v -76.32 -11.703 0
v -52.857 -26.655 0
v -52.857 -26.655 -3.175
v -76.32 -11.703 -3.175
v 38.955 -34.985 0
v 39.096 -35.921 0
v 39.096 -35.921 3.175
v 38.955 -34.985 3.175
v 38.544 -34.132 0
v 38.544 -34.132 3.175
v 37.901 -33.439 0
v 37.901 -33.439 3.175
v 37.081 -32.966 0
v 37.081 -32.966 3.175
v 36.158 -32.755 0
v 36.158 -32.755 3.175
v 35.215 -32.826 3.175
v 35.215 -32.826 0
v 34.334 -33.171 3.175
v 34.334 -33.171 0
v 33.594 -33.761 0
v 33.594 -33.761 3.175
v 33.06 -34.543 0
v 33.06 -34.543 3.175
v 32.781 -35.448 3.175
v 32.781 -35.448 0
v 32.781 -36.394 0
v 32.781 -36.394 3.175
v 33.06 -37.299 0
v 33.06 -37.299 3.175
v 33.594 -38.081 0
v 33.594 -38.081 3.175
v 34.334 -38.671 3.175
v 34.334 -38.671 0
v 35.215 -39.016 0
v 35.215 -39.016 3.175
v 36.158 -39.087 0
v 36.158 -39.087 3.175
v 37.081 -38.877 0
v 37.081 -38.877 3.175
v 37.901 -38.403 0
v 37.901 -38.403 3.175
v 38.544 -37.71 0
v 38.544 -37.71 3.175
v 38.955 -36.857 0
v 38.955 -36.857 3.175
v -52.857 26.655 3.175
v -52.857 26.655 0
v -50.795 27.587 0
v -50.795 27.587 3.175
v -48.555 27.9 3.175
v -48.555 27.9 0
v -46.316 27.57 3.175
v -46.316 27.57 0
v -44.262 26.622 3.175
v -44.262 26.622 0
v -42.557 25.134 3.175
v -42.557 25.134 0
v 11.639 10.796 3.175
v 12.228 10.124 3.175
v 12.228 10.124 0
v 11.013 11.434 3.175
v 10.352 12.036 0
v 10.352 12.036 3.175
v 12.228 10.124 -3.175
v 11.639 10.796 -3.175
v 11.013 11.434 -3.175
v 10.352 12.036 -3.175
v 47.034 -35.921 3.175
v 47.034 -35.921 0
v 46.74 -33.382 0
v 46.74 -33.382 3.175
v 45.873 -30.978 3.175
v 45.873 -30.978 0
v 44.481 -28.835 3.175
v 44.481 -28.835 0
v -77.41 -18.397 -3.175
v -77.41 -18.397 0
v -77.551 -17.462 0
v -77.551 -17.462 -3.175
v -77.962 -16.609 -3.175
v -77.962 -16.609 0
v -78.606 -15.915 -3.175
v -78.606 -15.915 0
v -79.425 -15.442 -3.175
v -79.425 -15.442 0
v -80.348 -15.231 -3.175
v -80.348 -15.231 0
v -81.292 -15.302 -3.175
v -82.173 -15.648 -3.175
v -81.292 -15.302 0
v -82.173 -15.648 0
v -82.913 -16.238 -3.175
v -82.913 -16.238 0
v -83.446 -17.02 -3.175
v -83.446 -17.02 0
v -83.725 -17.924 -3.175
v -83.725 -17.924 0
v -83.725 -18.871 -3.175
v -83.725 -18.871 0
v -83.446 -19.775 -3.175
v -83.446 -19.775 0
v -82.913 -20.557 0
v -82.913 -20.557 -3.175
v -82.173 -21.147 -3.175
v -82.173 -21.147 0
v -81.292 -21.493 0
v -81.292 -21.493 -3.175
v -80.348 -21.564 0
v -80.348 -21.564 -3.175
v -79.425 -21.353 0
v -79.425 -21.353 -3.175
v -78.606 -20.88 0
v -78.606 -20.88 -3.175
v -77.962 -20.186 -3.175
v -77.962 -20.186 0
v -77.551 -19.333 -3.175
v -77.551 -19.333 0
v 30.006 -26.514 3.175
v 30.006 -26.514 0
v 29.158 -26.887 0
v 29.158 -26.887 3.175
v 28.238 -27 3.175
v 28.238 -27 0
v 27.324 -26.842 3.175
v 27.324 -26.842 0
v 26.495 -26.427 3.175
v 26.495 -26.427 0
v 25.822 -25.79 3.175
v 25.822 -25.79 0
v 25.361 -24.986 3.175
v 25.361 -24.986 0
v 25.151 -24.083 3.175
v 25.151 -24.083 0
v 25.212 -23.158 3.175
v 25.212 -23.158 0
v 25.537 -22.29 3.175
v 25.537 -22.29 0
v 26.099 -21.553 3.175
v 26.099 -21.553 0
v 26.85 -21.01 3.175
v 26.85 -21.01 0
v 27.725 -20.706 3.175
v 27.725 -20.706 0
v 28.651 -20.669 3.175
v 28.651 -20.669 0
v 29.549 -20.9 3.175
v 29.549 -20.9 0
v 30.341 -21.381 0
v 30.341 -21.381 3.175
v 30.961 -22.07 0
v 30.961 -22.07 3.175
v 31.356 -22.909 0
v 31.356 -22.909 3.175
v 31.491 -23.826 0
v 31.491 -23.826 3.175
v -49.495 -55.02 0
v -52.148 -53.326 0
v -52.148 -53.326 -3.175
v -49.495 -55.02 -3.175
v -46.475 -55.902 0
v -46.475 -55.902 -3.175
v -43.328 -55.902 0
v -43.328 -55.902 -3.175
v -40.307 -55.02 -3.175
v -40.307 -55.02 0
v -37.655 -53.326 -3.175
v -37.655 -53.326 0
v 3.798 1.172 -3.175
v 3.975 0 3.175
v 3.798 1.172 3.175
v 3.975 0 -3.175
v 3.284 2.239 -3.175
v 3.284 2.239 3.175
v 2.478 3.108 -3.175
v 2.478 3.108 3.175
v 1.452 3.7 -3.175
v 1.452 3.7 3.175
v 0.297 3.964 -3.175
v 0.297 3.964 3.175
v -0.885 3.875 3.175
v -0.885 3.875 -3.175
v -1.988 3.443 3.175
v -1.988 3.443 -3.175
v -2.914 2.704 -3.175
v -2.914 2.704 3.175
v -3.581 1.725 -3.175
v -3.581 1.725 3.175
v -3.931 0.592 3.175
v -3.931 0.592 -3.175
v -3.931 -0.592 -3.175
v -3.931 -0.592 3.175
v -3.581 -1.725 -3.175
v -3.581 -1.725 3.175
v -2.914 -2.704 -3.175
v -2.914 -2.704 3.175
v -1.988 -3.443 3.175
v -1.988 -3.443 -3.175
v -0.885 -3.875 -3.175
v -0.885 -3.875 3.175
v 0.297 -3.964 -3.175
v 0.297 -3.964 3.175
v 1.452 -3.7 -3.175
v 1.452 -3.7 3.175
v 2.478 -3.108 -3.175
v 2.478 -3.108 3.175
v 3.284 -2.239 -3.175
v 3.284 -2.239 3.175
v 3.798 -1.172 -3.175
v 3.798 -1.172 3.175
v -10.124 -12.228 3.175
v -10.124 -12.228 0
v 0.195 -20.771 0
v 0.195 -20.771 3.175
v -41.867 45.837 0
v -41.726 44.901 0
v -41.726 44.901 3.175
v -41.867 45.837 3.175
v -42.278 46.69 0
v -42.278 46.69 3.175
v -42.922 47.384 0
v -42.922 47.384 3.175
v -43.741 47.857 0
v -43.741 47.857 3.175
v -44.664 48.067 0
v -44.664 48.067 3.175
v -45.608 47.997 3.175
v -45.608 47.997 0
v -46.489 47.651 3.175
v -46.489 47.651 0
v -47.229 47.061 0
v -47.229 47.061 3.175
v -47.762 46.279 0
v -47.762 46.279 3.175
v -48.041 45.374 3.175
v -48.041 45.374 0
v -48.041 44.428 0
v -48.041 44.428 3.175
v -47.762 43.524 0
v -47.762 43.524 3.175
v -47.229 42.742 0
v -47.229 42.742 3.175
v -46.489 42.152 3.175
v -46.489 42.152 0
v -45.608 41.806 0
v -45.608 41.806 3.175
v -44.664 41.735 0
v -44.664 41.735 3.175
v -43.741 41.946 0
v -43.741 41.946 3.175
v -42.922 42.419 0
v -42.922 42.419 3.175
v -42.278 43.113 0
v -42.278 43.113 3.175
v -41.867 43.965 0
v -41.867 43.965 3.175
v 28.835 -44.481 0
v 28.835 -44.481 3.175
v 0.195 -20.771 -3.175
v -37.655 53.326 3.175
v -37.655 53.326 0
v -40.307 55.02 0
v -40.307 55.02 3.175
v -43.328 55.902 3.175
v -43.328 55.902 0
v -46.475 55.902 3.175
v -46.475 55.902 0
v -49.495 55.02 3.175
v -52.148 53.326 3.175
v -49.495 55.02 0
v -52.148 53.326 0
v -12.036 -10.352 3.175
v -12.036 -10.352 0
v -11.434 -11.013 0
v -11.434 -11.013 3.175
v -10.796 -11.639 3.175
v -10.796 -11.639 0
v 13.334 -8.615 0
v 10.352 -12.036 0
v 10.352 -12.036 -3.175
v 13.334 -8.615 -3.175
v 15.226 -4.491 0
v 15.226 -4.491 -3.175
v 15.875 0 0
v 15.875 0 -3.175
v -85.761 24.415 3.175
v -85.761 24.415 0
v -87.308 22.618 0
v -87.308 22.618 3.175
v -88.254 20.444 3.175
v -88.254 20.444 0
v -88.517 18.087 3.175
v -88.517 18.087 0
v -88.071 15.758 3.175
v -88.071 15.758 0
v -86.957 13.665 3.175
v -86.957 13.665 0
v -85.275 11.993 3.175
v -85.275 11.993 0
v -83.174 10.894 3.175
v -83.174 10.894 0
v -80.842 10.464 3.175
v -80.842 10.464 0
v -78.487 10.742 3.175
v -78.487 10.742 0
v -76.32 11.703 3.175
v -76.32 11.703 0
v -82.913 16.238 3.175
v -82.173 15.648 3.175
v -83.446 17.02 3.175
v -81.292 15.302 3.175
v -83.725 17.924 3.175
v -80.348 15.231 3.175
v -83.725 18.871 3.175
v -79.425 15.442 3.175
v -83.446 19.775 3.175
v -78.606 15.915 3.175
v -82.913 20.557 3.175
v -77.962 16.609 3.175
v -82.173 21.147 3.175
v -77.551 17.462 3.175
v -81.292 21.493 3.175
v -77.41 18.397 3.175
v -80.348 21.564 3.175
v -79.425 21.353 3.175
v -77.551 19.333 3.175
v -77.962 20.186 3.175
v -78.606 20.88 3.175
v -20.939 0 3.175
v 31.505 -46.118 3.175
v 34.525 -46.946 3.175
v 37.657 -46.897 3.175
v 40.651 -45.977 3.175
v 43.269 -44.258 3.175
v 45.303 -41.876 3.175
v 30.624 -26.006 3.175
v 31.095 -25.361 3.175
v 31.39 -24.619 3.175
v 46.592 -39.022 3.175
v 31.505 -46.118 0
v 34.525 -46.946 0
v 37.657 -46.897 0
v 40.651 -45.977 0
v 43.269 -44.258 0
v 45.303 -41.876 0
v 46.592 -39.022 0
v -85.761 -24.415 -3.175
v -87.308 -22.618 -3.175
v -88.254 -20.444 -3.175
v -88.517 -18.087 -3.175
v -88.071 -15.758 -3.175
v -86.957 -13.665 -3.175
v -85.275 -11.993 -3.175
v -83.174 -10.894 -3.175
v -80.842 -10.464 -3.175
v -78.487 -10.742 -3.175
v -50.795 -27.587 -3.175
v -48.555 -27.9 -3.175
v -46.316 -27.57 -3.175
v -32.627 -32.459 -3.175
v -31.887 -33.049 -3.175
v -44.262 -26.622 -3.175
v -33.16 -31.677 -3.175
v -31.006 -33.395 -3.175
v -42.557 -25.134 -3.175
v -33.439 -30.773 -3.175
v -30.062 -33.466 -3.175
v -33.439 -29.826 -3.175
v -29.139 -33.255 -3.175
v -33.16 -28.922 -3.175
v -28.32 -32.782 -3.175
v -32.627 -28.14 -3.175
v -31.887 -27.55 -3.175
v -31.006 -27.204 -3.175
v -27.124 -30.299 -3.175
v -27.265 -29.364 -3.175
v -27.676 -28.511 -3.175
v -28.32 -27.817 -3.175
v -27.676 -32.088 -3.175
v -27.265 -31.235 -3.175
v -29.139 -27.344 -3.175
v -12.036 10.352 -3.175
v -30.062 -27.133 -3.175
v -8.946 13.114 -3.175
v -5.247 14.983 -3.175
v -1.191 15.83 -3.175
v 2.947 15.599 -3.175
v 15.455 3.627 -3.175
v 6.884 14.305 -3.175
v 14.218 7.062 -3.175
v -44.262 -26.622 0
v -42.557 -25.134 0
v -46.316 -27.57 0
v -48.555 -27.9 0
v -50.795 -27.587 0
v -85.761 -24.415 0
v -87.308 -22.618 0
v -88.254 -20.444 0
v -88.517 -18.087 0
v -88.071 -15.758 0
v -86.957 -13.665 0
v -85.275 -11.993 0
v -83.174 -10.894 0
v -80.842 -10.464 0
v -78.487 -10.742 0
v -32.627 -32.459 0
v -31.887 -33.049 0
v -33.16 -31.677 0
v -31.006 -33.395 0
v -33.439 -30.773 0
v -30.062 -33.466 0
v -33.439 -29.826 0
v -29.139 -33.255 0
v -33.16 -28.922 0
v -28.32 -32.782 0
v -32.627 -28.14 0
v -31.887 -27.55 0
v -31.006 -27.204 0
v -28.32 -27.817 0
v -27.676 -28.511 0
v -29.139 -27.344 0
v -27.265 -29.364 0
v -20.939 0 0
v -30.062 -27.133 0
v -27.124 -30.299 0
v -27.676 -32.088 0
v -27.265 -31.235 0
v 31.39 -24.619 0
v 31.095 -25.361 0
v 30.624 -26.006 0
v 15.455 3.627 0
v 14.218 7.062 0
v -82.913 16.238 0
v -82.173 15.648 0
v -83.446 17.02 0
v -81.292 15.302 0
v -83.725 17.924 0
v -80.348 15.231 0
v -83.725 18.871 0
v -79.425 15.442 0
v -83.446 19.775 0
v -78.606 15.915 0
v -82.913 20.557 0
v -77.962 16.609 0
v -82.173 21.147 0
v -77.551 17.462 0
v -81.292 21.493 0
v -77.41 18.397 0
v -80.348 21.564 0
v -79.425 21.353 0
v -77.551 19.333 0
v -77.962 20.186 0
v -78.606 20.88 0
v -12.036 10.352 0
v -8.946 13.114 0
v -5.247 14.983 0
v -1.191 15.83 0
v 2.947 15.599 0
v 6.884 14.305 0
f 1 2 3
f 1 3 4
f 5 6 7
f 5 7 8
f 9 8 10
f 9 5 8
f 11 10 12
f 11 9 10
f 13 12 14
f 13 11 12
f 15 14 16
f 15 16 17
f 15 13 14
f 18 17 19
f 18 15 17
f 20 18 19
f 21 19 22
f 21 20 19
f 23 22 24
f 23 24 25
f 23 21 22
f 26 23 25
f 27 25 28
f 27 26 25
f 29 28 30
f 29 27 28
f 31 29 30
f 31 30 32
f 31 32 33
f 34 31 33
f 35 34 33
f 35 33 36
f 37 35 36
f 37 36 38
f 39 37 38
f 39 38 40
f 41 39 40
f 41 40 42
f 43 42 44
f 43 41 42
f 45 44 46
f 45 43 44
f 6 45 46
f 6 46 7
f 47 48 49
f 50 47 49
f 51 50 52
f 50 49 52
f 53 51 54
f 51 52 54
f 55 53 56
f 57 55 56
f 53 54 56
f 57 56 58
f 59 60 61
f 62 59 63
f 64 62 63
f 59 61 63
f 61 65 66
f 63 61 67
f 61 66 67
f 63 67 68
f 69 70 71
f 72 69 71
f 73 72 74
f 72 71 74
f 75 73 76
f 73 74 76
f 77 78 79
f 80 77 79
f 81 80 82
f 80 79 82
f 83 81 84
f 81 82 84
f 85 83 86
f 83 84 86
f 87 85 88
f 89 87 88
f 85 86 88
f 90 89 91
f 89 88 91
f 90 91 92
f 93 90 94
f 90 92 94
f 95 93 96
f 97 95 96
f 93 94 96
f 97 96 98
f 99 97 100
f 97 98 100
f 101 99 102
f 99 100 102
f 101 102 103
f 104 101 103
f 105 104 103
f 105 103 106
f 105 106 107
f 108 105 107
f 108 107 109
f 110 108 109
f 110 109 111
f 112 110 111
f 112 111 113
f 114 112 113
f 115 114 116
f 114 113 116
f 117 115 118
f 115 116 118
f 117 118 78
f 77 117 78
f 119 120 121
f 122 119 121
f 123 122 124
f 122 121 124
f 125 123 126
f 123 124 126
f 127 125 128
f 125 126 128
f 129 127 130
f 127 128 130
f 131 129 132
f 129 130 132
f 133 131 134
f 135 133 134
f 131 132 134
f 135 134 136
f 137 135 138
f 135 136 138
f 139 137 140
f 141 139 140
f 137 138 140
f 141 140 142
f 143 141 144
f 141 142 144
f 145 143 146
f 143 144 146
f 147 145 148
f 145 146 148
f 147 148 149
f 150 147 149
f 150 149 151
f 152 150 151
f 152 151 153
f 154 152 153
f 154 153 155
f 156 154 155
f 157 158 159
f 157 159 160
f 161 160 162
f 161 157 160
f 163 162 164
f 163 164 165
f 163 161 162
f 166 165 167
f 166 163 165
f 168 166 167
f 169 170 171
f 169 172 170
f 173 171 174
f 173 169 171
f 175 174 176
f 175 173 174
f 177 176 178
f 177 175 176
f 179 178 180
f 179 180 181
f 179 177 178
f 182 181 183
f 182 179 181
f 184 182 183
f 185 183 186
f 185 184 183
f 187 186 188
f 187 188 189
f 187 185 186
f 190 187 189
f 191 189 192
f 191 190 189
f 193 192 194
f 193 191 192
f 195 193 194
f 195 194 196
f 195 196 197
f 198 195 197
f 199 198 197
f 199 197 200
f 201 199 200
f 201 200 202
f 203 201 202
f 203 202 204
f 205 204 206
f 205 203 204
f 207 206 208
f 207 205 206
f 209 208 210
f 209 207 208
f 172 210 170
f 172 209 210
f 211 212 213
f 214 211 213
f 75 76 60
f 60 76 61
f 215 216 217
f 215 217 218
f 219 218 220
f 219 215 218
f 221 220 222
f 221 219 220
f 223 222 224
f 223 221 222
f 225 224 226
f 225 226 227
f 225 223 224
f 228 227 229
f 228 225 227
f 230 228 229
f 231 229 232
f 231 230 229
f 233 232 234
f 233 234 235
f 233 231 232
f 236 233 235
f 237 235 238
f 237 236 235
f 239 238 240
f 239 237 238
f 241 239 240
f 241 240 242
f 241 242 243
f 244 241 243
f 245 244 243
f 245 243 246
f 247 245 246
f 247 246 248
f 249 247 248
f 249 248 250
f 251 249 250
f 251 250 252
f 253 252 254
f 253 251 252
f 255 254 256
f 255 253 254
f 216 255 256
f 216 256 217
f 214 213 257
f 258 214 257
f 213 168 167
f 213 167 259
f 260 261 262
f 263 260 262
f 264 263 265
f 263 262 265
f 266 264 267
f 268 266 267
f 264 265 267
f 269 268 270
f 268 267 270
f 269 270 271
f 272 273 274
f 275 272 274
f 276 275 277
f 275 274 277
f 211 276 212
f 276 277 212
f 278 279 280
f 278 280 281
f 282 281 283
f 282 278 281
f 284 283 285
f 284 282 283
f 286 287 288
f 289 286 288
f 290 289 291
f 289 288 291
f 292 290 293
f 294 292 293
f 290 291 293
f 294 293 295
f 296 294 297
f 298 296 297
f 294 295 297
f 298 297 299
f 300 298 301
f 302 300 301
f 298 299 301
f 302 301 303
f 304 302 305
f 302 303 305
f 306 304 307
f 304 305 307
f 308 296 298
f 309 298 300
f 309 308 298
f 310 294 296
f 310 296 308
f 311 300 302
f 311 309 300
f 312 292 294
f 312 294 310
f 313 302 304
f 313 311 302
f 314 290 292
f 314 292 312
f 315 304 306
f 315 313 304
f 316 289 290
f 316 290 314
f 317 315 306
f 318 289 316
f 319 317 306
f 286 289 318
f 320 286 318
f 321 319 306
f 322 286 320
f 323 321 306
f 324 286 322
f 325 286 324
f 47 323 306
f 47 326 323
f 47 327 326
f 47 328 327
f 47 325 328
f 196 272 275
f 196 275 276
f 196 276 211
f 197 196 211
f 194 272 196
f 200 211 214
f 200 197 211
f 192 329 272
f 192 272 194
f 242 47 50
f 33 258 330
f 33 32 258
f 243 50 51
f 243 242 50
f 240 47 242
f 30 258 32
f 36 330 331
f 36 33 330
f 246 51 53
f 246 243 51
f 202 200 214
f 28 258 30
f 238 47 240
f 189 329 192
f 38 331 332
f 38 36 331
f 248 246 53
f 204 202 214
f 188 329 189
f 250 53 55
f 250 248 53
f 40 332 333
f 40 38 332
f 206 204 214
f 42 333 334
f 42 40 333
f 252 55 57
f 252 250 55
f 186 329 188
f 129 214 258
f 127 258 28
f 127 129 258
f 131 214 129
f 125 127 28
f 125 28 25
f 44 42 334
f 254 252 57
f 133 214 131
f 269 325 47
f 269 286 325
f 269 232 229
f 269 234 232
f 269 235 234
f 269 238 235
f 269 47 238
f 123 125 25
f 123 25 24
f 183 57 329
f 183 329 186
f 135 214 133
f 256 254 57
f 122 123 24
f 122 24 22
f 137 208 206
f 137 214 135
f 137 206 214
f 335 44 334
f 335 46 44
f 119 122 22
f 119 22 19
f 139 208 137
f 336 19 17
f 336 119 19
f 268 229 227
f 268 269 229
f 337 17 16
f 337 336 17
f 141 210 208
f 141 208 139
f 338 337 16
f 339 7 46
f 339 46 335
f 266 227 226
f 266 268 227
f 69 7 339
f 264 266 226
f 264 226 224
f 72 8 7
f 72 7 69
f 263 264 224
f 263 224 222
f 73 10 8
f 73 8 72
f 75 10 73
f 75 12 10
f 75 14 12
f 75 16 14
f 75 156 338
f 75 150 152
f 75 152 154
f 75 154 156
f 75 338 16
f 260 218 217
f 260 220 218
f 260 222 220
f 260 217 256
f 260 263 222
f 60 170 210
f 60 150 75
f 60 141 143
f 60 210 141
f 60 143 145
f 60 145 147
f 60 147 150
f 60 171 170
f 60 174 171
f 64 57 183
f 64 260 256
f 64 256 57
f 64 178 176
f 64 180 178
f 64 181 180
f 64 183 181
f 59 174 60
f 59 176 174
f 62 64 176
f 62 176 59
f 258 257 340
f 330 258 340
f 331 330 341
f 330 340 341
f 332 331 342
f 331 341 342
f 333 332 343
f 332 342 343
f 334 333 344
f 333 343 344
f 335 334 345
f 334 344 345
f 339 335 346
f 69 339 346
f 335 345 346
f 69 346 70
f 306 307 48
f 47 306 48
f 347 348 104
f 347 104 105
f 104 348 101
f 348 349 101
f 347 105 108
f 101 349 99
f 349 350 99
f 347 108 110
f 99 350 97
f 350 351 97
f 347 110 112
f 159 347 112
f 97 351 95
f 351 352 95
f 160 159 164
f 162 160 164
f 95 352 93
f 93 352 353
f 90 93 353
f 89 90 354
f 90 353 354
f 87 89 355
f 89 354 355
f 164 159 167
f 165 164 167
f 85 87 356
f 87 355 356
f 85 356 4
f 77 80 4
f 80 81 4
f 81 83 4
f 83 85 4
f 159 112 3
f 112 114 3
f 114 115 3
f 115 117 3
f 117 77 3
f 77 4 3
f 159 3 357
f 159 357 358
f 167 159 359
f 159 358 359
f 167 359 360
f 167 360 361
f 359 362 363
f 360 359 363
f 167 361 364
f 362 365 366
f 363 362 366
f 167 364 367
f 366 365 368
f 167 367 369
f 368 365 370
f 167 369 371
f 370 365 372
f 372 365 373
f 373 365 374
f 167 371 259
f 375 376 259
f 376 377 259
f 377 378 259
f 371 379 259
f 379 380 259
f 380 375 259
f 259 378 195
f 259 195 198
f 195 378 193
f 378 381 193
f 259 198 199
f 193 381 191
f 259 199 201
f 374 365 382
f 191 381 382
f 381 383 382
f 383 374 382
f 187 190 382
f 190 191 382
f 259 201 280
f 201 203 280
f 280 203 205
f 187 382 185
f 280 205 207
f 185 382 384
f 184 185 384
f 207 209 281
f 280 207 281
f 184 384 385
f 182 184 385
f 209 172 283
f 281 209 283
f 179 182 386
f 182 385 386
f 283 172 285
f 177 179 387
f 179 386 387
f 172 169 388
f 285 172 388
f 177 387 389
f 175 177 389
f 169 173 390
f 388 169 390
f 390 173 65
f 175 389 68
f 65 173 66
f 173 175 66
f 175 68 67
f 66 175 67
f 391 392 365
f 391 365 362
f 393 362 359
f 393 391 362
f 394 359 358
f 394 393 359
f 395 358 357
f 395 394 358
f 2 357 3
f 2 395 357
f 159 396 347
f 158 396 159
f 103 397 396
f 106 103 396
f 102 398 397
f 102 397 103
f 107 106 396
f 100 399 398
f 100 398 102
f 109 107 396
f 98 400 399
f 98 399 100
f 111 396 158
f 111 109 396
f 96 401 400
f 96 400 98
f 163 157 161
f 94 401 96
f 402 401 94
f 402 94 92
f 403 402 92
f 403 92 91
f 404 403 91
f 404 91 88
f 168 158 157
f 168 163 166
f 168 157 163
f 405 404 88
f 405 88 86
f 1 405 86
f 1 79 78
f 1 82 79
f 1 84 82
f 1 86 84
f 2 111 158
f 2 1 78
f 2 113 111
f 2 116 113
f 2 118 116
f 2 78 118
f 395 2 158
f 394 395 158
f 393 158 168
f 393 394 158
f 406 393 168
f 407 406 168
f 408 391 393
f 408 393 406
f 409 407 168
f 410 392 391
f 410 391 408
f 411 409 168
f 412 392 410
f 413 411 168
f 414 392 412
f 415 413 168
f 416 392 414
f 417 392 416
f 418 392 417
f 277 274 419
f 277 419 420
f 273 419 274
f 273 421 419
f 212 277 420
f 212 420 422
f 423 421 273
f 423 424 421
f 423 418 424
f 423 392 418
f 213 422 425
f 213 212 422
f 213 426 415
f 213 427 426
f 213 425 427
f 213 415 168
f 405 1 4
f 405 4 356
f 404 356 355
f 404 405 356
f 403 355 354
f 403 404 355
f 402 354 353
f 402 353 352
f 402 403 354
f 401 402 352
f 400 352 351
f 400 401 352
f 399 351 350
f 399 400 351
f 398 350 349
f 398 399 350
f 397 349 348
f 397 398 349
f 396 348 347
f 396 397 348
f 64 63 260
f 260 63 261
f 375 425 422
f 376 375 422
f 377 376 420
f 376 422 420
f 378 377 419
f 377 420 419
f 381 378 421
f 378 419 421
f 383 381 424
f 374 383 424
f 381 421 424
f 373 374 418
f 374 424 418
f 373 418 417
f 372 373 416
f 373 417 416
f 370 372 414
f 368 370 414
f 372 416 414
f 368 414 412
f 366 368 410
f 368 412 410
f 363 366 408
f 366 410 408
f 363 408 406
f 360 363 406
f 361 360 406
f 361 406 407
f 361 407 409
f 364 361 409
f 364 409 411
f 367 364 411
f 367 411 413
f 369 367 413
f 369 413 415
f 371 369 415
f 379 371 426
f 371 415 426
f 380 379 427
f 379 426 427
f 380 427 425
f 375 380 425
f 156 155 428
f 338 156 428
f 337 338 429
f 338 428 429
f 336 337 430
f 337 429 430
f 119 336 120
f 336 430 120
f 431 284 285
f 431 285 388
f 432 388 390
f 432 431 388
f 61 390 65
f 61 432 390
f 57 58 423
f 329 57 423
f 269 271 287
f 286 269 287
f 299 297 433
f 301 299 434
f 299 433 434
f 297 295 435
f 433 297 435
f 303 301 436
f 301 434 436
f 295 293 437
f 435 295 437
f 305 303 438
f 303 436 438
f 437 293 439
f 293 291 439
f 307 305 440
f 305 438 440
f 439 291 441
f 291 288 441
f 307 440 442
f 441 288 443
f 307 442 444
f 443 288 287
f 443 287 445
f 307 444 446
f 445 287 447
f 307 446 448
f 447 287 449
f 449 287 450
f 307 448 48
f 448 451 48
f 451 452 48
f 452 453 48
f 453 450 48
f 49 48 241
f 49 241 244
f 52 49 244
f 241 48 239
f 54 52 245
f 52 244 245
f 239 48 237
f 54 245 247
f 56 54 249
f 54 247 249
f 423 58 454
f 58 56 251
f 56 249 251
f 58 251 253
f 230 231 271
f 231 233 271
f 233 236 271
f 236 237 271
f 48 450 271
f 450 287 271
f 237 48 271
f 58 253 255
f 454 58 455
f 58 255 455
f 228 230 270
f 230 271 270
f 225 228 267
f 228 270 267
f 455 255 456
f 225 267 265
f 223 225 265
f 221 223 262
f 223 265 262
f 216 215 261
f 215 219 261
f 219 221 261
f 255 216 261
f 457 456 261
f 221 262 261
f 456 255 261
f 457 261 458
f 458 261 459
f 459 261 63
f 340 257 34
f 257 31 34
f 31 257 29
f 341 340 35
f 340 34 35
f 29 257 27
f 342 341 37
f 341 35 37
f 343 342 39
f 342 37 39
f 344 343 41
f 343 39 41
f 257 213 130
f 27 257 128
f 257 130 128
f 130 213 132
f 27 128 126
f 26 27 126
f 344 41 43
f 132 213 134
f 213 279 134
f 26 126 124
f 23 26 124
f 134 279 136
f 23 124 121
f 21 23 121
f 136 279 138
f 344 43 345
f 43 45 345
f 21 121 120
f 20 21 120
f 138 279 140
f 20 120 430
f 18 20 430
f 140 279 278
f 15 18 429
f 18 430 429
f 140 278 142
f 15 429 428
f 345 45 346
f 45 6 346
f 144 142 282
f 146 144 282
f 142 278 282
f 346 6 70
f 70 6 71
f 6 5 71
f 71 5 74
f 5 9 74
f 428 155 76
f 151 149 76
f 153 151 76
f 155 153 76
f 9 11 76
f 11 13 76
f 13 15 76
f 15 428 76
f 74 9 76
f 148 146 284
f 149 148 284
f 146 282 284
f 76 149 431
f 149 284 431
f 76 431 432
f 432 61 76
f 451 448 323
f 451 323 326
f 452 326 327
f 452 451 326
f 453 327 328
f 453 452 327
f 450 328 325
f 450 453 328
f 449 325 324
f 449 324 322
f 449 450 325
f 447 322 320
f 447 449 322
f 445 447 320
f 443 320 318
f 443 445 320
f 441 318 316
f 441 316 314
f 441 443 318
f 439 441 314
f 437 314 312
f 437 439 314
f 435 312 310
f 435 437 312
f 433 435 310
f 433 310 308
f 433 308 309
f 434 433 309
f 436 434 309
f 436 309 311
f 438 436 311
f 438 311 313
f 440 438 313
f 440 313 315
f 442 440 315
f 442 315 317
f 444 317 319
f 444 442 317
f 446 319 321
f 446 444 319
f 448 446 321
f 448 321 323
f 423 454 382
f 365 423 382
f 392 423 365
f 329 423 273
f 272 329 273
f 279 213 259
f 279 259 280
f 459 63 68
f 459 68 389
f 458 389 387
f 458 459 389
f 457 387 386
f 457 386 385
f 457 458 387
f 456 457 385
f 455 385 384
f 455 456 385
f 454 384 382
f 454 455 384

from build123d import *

# Parameters (mm, degrees)
F0_R     = 3.175
F0_R_2   = 3.9751
F1_DEPTH = 3.175
F2_DEPTH = 3.175


# Not quite as in the source:
# - after a boolean that leaves OpenCascade's solid faulty, fix() repairs it


with BuildPart() as f1:
    # F0 (on Top) → F1 (new body)
    with BuildSketch(Plane.XY):
        with BuildLine():
            Line((0.1954344954, -20.7710836138), (-10.1235074968, -12.2282550252))
            ThreePointArc((-10.1235074968, -12.2282550252), (-11.1192092809, -11.3304373246), (-12.0356034274, -10.3518054047))
            Line((-12.0356034274, -10.3518054047), (-20.9391765456, 0))
            Line((-20.9391765456, 0), (-42.5571087943, -25.134249466))
            ThreePointArc((-42.5571087943, -25.134249466), (-47.4235249822, -27.815033629), (-52.8569612369, -26.6546971654))
            Line((-52.8569612369, -26.6546971654), (-76.3196547531, -11.7034610596))
            ThreePointArc((-76.3196547531, -11.7034610596), (-73.6260110422, -14.5799404883), (-72.6477527528, -18.3973821792))
            ThreePointArc((-72.6477527528, -18.3973821792), (-77.2746501981, -25.611522251), (-85.7611554551, -24.4151838929))
            Line((-85.7611554551, -24.4151838929), (-52.1475443887, -53.3262030046))
            ThreePointArc((-52.1475443887, -53.3262030046), (-49.5361241819, -34.8014845049), (-33.7887806053, -44.9012806053))
            ThreePointArc((-33.7887806053, -44.9012806053), (-34.8014845049, -49.5361241819), (-37.655016822, -53.3262030046))
            Line((-37.655016822, -53.3262030046), (0.1954344954, -20.7710836138))
        make_face()
        with Locations((-30.2993841525, -30.2993841525)):
            Circle(F0_R, mode=Mode.SUBTRACT)
        with BuildLine():
            ThreePointArc((-52.1475443887, -53.3262030046), (-44.9012806053, -56.0137806053), (-37.655016822, -53.3262030046))
            ThreePointArc((-37.655016822, -53.3262030046), (-34.8014845049, -49.5361241819), (-33.7887806053, -44.9012806053))
            ThreePointArc((-33.7887806053, -44.9012806053), (-49.5361241819, -34.8014845049), (-52.1475443887, -53.3262030046))
        make_face()
        with BuildLine():
            ThreePointArc((-76.3196547531, -11.7034610596), (-86.9573903855, -13.664542837), (-85.7611554551, -24.4151838929))
            ThreePointArc((-85.7611554551, -24.4151838929), (-77.2746501981, -25.611522251), (-72.6477527528, -18.3973821792))
            ThreePointArc((-72.6477527528, -18.3973821792), (-73.6260110422, -14.5799404883), (-76.3196547531, -11.7034610596))
        make_face()
        with Locations((-80.5852527528, -18.3973821792)):
            Circle(F0_R, mode=Mode.SUBTRACT)
        with BuildLine():
            Line((0.1954344954, -20.7710836138), (10.3518055249, -12.0356033241))
            ThreePointArc((10.3518055249, -12.0356033241), (0.1493608613, -15.8742973493), (-10.1235074968, -12.2282550252))
            Line((-10.1235074968, -12.2282550252), (0.1954344954, -20.7710836138))
        make_face()
        with BuildLine():
            ThreePointArc((-12.0356034274, -10.3518054047), (-15.875, 6.76e-08), (-12.0356033393, 10.3518055072))
            Line((-12.0356033393, 10.3518055072), (-20.9391765456, 0))
            Line((-20.9391765456, 0), (-12.0356034274, -10.3518054047))
        make_face()
        with BuildLine():
            ThreePointArc((10.3518055249, -12.0356033241), (14.4282801766, -6.6212050373), (15.875, 0))
            ThreePointArc((15.875, 0), (14.9355142785, 5.3801522504), (12.2282550252, 10.1235074968))
            ThreePointArc((12.2282550252, 10.1235074968), (11.3304373246, 11.1192092809), (10.3518054047, 12.0356034274))
            ThreePointArc((10.3518054047, 12.0356034274), (-1.1906249326, 15.8302886035), (-12.0356033393, 10.3518055072))
            ThreePointArc((-12.0356033393, 10.3518055072), (-15.875, 6.76e-08), (-12.0356034274, -10.3518054047))
            ThreePointArc((-12.0356034274, -10.3518054047), (-11.1192092809, -11.3304373246), (-10.1235074968, -12.2282550252))
            ThreePointArc((-10.1235074968, -12.2282550252), (0.1493608613, -15.8742973493), (10.3518055249, -12.0356033241))
        make_face()
        Circle(F0_R_2, mode=Mode.SUBTRACT)
    extrude(amount=-F1_DEPTH)

    # F0 (on Top) → F2 (join)
    with BuildSketch(Plane.XY):
        with BuildLine():
            ThreePointArc((-12.0356033393, 10.3518055072), (-1.1906249326, 15.8302886035), (10.3518054047, 12.0356034274))
            Line((10.3518054047, 12.0356034274), (-37.655016822, 53.3262030046))
            ThreePointArc((-37.655016822, 53.3262030046), (-34.8014845049, 49.5361241819), (-33.7887806053, 44.9012806053))
            ThreePointArc((-33.7887806053, 44.9012806053), (-49.5361241819, 34.8014845049), (-52.1475443887, 53.3262030046))
            Line((-52.1475443887, 53.3262030046), (-85.7611554551, 24.4151838929))
            ThreePointArc((-85.7611554551, 24.4151838929), (-77.2746501981, 25.611522251), (-72.6477527528, 18.3973821792))
            ThreePointArc((-72.6477527528, 18.3973821792), (-73.6260112444, 14.5799401196), (-76.3196554623, 11.7034606077))
            Line((-76.3196554623, 11.7034606077), (-52.8569612369, 26.6546971654))
            ThreePointArc((-52.8569612369, 26.6546971654), (-47.4235249822, 27.815033629), (-42.5571087943, 25.134249466))
            Line((-42.5571087943, 25.134249466), (-20.9391765456, 0))
            Line((-20.9391765456, 0), (-12.0356033393, 10.3518055072))
        make_face()
        with BuildLine():
            ThreePointArc((-72.6477527528, 18.3973821792), (-77.2746501981, 25.611522251), (-85.7611554551, 24.4151838929))
            ThreePointArc((-85.7611554551, 24.4151838929), (-86.9573906362, 13.6645431745), (-76.3196554623, 11.7034606077))
            ThreePointArc((-76.3196554623, 11.7034606077), (-73.6260112444, 14.5799401196), (-72.6477527528, 18.3973821792))
        make_face()
        with Locations((-80.5852527528, 18.3973821792)):
            Circle(F0_R, mode=Mode.SUBTRACT)
        with BuildLine():
            ThreePointArc((-33.7887806053, 44.9012806053), (-34.8014845049, 49.5361241819), (-37.655016822, 53.3262030046))
            ThreePointArc((-37.655016822, 53.3262030046), (-44.9012806053, 56.0137806053), (-52.1475443887, 53.3262030046))
            ThreePointArc((-52.1475443887, 53.3262030046), (-49.5361241819, 34.8014845049), (-33.7887806053, 44.9012806053))
        make_face()
        with Locations((-44.9012806053, 44.9012806053)):
            Circle(F0_R, mode=Mode.SUBTRACT)
        with BuildLine():
            ThreePointArc((10.3518055249, -12.0356033241), (14.4282801766, -6.6212050373), (15.875, 0))
            ThreePointArc((15.875, 0), (14.9355142785, 5.3801522504), (12.2282550252, 10.1235074968))
            ThreePointArc((12.2282550252, 10.1235074968), (11.3304373246, 11.1192092809), (10.3518054047, 12.0356034274))
            ThreePointArc((10.3518054047, 12.0356034274), (-1.1906249326, 15.8302886035), (-12.0356033393, 10.3518055072))
            ThreePointArc((-12.0356033393, 10.3518055072), (-15.875, 6.76e-08), (-12.0356034274, -10.3518054047))
            ThreePointArc((-12.0356034274, -10.3518054047), (-11.1192092809, -11.3304373246), (-10.1235074968, -12.2282550252))
            ThreePointArc((-10.1235074968, -12.2282550252), (0.1493608613, -15.8742973493), (10.3518055249, -12.0356033241))
        make_face()
        Circle(F0_R_2, mode=Mode.SUBTRACT)
        with BuildLine():
            ThreePointArc((-12.0356034274, -10.3518054047), (-15.875, 6.76e-08), (-12.0356033393, 10.3518055072))
            Line((-12.0356033393, 10.3518055072), (-20.9391765456, 0))
            Line((-20.9391765456, 0), (-12.0356034274, -10.3518054047))
        make_face()
        with BuildLine():
            Line((0.1954344954, -20.7710836138), (10.3518055249, -12.0356033241))
            ThreePointArc((10.3518055249, -12.0356033241), (0.1493608613, -15.8742973493), (-10.1235074968, -12.2282550252))
            Line((-10.1235074968, -12.2282550252), (0.1954344954, -20.7710836138))
        make_face()
        with BuildLine():
            ThreePointArc((12.2282550252, 10.1235074968), (14.9355142785, 5.3801522504), (15.875, 0))
            ThreePointArc((15.875, 0), (14.4282801766, -6.6212050373), (10.3518055249, -12.0356033241))
            Line((10.3518055249, -12.0356033241), (0.1954344954, -20.7710836138))
            Line((0.1954344954, -20.7710836138), (28.8345692365, -44.4808030019))
            ThreePointArc((28.8345692365, -44.4808030019), (24.8320655021, -35.1980826181), (30.0059355892, -26.5136135964))
            ThreePointArc((30.0059355892, -26.5136135964), (37.6803722933, -24.9486796329), (44.4808030542, -28.8345692997))
            Line((44.4808030542, -28.8345692997), (12.2282550252, 10.1235074968))
        make_face()
        with BuildLine():
            ThreePointArc((31.490910058, -23.8257819975), (31.094979692, -25.361163699), (30.0059355892, -26.5136135964))
            ThreePointArc((30.0059355892, -26.5136135964), (25.536840424, -22.290400296), (31.490910058, -23.8257819975))
        make_face(mode=Mode.SUBTRACT)
        with BuildLine():
            ThreePointArc((47.0335244843, -35.9210244843), (46.3758844931, -32.1549179476), (44.4808030542, -28.8345692997))
            ThreePointArc((44.4808030542, -28.8345692997), (37.6803722933, -24.9486796329), (30.0059355892, -26.5136135964))
            ThreePointArc((30.0059355892, -26.5136135964), (24.8320655021, -35.1980826181), (28.8345692365, -44.4808030019))
            ThreePointArc((28.8345692365, -44.4808030019), (40.650687385, -45.9767663811), (47.0335244843, -35.9210244843))
        make_face()
        with Locations((35.9210244843, -35.9210244843)):
            Circle(F0_R, mode=Mode.SUBTRACT)
    extrude(amount=F2_DEPTH)

    add(f1.part.fix(), mode=Mode.REPLACE)


solid = f1.part
